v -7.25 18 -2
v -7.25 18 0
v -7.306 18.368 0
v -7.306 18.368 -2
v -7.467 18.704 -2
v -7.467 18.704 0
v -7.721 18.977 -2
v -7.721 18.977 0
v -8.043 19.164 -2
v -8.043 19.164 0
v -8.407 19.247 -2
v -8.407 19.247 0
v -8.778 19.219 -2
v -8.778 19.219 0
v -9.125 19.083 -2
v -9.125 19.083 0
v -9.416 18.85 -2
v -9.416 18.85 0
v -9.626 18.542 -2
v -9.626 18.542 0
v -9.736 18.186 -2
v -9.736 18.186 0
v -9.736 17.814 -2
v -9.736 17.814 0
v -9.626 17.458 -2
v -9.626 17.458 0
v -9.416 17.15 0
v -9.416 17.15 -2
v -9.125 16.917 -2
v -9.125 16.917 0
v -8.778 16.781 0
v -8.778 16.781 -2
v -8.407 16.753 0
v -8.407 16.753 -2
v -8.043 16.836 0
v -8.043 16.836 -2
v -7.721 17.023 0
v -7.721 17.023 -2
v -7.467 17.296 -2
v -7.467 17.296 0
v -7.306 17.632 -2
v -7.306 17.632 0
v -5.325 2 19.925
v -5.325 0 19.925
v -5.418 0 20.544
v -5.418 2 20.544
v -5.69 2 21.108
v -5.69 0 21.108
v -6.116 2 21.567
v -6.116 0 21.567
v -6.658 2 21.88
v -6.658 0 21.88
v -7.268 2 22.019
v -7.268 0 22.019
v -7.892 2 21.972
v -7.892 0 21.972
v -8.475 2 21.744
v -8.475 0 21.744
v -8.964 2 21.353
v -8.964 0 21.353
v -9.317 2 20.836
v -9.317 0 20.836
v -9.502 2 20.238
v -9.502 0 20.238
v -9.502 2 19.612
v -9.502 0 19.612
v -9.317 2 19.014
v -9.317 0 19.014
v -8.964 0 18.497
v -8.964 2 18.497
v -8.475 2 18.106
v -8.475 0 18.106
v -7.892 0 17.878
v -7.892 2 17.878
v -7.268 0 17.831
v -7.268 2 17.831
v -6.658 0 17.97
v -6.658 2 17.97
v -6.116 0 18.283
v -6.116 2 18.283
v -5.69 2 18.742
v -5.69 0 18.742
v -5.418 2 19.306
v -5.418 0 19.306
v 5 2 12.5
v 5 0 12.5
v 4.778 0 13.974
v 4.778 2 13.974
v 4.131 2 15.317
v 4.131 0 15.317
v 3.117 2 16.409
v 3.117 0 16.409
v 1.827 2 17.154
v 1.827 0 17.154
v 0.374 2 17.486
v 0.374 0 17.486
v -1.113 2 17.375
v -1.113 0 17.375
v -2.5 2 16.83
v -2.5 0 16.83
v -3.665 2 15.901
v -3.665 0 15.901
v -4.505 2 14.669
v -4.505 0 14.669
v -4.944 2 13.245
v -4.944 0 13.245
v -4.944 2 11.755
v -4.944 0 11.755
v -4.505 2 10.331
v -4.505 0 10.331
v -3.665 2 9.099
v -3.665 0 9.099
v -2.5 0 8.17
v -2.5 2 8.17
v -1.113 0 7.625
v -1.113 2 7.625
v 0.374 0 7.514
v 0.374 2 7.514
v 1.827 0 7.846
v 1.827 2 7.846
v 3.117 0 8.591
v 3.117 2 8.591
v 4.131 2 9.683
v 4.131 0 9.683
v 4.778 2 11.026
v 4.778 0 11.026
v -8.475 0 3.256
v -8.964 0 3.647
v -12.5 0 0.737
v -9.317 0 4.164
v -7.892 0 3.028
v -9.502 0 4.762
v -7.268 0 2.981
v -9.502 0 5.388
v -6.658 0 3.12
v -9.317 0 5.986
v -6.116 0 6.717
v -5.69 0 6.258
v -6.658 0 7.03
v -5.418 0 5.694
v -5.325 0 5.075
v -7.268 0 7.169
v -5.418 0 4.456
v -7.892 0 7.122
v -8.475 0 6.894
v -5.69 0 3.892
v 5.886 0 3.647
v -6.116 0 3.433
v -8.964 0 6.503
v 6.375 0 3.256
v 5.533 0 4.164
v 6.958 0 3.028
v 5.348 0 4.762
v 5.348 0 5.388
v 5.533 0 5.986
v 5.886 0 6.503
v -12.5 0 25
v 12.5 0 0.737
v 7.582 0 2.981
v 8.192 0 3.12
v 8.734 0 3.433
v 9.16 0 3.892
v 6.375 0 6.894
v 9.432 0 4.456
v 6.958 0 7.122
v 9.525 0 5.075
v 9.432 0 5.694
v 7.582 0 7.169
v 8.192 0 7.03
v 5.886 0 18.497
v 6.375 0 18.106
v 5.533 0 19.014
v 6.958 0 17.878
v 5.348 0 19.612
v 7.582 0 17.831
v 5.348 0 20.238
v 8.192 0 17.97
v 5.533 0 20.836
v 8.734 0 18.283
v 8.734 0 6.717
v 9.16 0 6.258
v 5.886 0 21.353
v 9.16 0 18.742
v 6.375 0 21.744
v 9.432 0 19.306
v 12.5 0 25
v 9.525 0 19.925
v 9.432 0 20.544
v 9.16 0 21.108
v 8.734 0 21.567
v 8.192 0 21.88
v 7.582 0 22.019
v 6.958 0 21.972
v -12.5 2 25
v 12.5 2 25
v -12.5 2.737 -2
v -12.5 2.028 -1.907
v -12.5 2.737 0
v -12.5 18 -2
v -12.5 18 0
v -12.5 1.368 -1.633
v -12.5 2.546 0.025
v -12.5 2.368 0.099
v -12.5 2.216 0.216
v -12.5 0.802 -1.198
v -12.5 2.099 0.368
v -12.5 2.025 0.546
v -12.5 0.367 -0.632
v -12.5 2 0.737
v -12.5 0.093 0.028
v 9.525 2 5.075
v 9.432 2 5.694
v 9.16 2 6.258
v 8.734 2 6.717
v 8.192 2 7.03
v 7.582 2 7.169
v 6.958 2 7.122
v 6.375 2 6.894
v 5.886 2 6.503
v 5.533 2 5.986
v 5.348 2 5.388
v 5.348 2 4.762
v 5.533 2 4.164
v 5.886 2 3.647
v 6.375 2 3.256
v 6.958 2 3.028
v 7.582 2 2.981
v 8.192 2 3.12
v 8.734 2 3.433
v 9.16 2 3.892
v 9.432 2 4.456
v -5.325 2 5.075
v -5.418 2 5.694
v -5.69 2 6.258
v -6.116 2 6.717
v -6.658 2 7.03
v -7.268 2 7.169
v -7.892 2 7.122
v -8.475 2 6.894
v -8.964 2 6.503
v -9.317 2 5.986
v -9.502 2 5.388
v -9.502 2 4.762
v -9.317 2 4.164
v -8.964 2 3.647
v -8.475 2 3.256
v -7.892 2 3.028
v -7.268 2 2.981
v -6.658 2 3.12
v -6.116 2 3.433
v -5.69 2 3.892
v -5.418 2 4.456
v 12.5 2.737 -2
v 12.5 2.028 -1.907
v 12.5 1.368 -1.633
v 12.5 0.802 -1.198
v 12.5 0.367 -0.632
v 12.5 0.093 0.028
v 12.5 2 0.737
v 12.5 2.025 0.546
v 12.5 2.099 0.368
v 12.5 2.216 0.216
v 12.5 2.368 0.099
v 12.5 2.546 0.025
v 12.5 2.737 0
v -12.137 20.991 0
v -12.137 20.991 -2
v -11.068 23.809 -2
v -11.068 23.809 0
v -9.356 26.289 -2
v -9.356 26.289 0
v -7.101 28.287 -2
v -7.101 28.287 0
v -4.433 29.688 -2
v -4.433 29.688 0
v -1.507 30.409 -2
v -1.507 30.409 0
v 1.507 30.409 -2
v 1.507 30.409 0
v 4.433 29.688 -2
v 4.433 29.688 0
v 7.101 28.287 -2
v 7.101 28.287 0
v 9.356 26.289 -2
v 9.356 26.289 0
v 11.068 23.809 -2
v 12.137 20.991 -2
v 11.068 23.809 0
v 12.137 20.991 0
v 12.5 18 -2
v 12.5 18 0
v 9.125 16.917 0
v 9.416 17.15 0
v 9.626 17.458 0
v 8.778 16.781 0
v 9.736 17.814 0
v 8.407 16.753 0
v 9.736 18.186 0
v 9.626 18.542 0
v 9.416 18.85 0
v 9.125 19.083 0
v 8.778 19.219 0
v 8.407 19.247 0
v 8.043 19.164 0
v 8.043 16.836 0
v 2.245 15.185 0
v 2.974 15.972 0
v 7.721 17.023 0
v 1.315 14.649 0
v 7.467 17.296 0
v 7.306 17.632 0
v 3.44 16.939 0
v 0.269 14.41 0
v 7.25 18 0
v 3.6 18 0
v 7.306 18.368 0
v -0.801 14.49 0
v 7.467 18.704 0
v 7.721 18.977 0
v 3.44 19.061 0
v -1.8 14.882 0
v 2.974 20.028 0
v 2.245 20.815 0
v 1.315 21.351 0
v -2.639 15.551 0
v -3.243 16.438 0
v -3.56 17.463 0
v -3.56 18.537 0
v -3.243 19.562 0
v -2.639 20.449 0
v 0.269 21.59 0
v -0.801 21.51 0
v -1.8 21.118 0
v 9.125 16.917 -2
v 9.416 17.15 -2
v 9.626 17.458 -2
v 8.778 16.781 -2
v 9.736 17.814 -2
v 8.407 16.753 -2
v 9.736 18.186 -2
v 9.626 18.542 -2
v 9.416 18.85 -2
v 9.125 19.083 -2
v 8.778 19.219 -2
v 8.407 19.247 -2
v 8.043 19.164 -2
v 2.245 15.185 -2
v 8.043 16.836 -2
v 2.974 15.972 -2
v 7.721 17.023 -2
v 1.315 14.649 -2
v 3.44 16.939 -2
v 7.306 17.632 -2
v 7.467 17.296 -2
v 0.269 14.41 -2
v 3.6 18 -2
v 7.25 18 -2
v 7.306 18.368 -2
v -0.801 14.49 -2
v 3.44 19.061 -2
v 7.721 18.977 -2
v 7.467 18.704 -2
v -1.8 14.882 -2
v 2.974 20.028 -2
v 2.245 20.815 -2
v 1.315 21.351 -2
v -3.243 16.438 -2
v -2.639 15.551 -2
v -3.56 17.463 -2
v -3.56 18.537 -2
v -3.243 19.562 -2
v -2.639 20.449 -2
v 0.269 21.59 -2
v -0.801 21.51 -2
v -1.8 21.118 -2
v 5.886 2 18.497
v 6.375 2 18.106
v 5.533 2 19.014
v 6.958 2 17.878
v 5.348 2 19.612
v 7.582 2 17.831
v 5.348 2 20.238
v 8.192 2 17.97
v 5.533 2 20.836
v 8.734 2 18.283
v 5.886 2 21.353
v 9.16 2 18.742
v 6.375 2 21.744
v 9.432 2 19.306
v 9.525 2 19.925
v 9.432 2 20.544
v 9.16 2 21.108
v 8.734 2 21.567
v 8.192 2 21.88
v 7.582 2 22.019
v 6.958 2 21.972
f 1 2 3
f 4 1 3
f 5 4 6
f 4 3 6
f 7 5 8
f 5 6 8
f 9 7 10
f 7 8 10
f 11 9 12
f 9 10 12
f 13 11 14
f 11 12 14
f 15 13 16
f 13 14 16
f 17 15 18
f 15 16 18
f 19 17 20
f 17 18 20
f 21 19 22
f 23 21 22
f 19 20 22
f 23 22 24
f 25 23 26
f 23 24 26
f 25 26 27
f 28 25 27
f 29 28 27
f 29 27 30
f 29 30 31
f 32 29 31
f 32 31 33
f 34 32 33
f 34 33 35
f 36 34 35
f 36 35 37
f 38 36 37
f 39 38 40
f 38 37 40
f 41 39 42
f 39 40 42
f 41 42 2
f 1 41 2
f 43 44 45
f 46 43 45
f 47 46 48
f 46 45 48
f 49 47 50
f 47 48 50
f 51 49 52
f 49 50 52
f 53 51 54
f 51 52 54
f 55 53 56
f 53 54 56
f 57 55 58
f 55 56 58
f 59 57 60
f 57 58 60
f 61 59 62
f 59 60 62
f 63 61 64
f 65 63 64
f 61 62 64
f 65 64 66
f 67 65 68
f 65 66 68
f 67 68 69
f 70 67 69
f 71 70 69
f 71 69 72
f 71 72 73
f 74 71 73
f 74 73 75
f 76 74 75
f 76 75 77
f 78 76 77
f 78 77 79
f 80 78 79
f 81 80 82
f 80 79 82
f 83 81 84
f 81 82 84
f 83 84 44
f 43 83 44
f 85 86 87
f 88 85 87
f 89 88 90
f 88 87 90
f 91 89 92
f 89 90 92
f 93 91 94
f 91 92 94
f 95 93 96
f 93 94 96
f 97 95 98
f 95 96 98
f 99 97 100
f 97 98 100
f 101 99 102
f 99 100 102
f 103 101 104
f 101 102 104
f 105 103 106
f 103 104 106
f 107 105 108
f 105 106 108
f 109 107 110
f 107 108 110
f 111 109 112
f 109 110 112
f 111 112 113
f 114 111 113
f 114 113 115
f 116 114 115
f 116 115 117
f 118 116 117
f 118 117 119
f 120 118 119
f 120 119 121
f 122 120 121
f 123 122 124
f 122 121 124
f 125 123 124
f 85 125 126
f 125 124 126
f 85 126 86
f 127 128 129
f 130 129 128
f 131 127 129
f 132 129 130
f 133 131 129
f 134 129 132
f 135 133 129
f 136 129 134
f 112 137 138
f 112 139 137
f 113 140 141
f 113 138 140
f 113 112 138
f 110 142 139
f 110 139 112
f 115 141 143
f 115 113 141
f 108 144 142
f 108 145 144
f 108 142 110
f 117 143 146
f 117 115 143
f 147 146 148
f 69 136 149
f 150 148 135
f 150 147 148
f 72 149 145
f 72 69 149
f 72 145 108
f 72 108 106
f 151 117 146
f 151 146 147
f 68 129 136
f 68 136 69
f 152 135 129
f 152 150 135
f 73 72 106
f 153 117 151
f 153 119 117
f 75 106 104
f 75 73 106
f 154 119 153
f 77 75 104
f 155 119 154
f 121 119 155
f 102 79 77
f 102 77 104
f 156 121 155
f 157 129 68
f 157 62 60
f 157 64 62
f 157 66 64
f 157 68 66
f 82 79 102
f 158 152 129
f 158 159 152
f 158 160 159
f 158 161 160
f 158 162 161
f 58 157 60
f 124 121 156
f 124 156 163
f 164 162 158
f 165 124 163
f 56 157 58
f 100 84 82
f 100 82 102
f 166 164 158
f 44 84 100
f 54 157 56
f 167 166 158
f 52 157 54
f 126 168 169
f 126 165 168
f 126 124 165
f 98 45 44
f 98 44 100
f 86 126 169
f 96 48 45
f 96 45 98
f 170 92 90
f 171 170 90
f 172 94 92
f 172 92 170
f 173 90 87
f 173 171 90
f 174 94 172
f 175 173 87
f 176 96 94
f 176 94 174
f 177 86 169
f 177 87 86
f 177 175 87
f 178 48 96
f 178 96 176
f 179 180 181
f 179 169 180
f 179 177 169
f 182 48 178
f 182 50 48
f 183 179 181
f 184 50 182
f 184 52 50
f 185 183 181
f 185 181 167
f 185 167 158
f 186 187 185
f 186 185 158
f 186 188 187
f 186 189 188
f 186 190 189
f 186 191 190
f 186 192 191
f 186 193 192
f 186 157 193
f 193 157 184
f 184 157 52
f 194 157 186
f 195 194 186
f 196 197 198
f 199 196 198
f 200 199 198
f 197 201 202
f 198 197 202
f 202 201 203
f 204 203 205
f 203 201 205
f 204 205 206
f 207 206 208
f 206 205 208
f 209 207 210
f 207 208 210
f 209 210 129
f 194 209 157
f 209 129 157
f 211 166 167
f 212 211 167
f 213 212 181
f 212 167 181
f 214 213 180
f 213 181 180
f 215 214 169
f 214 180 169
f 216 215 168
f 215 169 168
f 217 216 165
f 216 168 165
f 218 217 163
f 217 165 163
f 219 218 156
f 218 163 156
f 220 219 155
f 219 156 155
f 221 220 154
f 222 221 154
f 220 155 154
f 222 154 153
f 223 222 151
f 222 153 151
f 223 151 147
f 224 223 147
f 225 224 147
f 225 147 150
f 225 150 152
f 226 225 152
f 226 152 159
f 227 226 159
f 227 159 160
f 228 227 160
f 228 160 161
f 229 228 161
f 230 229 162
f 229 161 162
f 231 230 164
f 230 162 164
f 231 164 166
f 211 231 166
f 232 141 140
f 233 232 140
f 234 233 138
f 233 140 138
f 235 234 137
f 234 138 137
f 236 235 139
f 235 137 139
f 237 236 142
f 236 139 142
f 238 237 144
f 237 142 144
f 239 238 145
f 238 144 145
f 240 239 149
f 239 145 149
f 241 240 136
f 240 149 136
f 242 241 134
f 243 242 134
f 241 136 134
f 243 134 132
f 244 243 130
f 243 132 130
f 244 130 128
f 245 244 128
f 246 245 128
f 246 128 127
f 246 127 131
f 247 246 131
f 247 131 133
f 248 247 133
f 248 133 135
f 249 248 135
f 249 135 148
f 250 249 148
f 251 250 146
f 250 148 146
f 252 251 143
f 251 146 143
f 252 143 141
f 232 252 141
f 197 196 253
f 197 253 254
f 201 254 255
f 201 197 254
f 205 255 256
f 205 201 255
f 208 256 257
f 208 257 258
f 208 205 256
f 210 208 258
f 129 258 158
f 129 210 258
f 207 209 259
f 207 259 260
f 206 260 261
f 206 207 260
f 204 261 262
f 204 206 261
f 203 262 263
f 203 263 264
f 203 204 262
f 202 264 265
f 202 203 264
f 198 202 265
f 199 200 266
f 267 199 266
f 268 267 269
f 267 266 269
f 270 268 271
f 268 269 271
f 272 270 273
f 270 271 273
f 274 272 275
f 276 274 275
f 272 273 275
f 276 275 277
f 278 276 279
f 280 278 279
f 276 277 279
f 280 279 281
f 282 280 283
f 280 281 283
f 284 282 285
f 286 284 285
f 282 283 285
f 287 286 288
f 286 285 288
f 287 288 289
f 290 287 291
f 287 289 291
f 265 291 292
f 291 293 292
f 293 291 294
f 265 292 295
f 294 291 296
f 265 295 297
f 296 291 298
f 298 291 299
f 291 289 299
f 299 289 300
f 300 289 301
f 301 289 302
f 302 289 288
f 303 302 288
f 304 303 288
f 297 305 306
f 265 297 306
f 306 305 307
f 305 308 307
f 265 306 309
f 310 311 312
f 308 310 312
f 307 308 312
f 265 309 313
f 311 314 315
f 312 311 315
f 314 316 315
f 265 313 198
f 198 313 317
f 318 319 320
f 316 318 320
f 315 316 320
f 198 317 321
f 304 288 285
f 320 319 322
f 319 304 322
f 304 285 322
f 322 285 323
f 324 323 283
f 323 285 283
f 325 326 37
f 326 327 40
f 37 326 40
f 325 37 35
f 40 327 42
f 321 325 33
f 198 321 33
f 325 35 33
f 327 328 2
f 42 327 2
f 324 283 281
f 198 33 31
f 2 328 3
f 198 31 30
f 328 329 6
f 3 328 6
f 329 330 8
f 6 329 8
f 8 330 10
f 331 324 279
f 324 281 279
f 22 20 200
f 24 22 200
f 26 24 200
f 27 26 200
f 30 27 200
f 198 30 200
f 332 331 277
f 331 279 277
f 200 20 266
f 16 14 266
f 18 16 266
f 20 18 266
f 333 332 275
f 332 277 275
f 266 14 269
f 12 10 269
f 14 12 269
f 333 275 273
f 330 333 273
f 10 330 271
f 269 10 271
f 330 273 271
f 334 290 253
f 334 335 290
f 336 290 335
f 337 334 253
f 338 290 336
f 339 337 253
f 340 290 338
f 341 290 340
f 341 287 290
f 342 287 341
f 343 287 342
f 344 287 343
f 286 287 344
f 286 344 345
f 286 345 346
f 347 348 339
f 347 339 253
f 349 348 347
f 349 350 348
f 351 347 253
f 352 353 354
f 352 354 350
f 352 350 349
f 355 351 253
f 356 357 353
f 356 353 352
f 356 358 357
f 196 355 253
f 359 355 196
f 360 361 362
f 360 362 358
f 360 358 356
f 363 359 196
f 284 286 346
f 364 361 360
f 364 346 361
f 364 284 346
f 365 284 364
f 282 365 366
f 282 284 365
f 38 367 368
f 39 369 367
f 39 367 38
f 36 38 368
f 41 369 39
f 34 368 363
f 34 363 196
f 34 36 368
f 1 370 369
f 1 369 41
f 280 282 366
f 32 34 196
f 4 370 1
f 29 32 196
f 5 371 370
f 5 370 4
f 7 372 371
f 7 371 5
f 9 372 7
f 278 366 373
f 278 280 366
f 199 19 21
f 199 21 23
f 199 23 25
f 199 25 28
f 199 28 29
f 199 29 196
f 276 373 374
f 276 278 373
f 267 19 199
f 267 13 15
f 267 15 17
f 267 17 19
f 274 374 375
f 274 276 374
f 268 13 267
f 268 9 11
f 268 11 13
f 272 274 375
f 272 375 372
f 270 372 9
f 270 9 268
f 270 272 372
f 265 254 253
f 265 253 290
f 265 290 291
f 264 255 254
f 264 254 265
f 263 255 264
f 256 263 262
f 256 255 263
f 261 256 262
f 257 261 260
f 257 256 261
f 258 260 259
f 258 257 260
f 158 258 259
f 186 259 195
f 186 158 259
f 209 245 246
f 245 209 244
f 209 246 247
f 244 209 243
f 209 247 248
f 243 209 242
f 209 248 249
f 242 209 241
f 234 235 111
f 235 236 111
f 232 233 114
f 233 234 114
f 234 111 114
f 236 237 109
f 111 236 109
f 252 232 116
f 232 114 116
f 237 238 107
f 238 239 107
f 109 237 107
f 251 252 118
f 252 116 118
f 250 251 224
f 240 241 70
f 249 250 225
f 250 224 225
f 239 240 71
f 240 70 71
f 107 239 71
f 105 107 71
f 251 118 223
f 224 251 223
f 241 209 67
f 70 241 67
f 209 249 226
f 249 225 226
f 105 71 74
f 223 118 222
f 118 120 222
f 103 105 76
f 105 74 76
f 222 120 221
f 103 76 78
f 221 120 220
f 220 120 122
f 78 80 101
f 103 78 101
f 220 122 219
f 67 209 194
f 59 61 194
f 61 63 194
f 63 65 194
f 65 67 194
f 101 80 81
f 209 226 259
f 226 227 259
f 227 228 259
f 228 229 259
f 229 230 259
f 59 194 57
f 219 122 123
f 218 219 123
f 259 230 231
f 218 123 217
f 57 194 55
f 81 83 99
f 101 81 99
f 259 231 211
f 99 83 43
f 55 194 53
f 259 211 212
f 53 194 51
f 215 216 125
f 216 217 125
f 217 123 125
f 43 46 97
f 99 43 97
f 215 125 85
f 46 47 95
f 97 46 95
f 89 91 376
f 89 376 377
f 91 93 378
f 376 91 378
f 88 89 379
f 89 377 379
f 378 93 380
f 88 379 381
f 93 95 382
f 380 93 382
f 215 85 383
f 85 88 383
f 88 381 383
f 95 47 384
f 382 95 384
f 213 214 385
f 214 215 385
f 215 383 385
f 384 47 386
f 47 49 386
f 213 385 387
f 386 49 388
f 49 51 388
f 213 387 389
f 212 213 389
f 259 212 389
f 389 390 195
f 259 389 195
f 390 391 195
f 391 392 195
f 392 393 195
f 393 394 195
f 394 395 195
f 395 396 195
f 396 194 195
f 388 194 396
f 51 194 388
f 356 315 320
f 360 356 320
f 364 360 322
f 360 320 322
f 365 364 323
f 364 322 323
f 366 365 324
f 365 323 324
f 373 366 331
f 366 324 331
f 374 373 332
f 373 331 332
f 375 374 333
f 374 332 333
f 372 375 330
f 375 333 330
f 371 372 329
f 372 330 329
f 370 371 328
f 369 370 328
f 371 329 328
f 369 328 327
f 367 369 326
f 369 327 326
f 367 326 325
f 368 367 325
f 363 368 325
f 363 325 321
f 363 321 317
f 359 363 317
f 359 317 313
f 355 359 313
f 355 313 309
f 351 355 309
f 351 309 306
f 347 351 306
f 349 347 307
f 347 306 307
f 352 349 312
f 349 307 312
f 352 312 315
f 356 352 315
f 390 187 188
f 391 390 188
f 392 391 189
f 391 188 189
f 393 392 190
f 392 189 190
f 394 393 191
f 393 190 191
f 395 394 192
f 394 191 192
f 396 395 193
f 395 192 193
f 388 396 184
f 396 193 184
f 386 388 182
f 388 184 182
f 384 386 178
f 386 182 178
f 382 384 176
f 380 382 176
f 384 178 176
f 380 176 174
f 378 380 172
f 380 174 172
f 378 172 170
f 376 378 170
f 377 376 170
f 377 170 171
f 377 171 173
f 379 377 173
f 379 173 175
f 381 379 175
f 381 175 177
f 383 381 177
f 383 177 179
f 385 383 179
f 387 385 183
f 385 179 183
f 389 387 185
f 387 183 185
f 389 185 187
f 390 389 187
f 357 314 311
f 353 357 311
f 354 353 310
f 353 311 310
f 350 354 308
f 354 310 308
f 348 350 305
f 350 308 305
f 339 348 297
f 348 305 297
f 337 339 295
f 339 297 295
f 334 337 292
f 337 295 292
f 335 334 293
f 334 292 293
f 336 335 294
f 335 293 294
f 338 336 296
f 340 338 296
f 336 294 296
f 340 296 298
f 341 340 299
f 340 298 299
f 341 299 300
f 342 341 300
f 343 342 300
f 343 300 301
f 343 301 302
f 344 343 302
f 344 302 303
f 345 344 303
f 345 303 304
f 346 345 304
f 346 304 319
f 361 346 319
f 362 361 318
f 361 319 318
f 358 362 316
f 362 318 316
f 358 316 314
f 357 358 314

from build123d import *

# Parameters (mm, degrees)
SKETCH_1_R                       = 3.6
SKETCH_1_R_2                     = 1.25
SM_BASE_FLANGE_1_DEPTH           = 2
SM_EDGE_FLANGE_1_STRIP_W         = 9.4732
SM_EDGE_FLANGE_1_STRIP_H         = 2
SM_EDGE_FLANGE_1_STRIP_CUT_DEPTH = 25
SM_EDGE_FLANGE_1_DEPTH           = 25
SM_EDGE_FLANGE_1_PROFILE_W       = 25
SM_EDGE_FLANGE_1_PROFILE_H       = 24.2634
SM_EDGE_FLANGE_1_PROFILE_R       = 2.1
SM_EDGE_FLANGE_1_PROFILE_R_2     = 5
SM_EDGE_FLANGE_1_FLAT_DEPTH      = 2


# Sheet-metal steps are written as plain solids
with BuildPart() as part:
    # Sketch 1 → 基体-法兰1 (new body)
    with BuildSketch(Plane.XY):
        with BuildLine():
            Line((12.5, 0), (-12.5, 0))
            Line((-12.5, 0), (-12.5, 18))
            ThreePointArc((-12.5, 18), (0, 30.5), (12.5, 18))
            Line((12.5, 18), (12.5, 0))
        make_face()
        with Locations((0, 18)):
            Circle(SKETCH_1_R, mode=Mode.SUBTRACT)
        with Locations((-8.5, 18)):
            Circle(SKETCH_1_R_2, mode=Mode.SUBTRACT)
        with Locations(Location((8.5, 18, 0), (0, 0, 180))):
            Circle(SKETCH_1_R_2, mode=Mode.SUBTRACT)
    extrude(amount=-SM_BASE_FLANGE_1_DEPTH)

    # 边线-法兰1 strip (across the edge) → 边线-法兰1 strip cut (cut)
    with BuildSketch(Plane.YZ.offset(-12.5)):
        with Locations((-2, -1)):
            Rectangle(SM_EDGE_FLANGE_1_STRIP_W, SM_EDGE_FLANGE_1_STRIP_H)
    extrude(amount=SM_EDGE_FLANGE_1_STRIP_CUT_DEPTH, mode=Mode.SUBTRACT)

    # 边线-法兰1 bend section (across the edge) → 边线-法兰1 (add)
    with BuildSketch(Plane.YZ.offset(-12.5)):
        with BuildLine():
            Line((0, 0.7366), (2, 0.7366))
            ThreePointArc((2, 0.7366), (2.215745145, 0.215745145), (2.7366, 0))
            Line((2.7366, 0), (2.7366, -2))
            ThreePointArc((2.7366, -2), (0.801531583, -1.198468417), (0, 0.7366))
        make_face()
    extrude(amount=SM_EDGE_FLANGE_1_DEPTH)

    # 边线-法兰1 profile (on flange) → 边线-法兰1 flat (add)
    with BuildSketch(Plane.XZ):
        with Locations((0, 12.8683)):
            Rectangle(SM_EDGE_FLANGE_1_PROFILE_W, SM_EDGE_FLANGE_1_PROFILE_H)
        with Locations((-7.425, 5.075)):
            Circle(SM_EDGE_FLANGE_1_PROFILE_R, mode=Mode.SUBTRACT)
        with Locations((7.425, 5.075)):
            Circle(SM_EDGE_FLANGE_1_PROFILE_R, mode=Mode.SUBTRACT)
        with Locations((-7.425, 19.925)):
            Circle(SM_EDGE_FLANGE_1_PROFILE_R, mode=Mode.SUBTRACT)
        with Locations((0, 12.5)):
            Circle(SM_EDGE_FLANGE_1_PROFILE_R_2, mode=Mode.SUBTRACT)
        with Locations((7.425, 19.925)):
            Circle(SM_EDGE_FLANGE_1_PROFILE_R, mode=Mode.SUBTRACT)
    extrude(amount=-SM_EDGE_FLANGE_1_FLAT_DEPTH)


solid = part.part
